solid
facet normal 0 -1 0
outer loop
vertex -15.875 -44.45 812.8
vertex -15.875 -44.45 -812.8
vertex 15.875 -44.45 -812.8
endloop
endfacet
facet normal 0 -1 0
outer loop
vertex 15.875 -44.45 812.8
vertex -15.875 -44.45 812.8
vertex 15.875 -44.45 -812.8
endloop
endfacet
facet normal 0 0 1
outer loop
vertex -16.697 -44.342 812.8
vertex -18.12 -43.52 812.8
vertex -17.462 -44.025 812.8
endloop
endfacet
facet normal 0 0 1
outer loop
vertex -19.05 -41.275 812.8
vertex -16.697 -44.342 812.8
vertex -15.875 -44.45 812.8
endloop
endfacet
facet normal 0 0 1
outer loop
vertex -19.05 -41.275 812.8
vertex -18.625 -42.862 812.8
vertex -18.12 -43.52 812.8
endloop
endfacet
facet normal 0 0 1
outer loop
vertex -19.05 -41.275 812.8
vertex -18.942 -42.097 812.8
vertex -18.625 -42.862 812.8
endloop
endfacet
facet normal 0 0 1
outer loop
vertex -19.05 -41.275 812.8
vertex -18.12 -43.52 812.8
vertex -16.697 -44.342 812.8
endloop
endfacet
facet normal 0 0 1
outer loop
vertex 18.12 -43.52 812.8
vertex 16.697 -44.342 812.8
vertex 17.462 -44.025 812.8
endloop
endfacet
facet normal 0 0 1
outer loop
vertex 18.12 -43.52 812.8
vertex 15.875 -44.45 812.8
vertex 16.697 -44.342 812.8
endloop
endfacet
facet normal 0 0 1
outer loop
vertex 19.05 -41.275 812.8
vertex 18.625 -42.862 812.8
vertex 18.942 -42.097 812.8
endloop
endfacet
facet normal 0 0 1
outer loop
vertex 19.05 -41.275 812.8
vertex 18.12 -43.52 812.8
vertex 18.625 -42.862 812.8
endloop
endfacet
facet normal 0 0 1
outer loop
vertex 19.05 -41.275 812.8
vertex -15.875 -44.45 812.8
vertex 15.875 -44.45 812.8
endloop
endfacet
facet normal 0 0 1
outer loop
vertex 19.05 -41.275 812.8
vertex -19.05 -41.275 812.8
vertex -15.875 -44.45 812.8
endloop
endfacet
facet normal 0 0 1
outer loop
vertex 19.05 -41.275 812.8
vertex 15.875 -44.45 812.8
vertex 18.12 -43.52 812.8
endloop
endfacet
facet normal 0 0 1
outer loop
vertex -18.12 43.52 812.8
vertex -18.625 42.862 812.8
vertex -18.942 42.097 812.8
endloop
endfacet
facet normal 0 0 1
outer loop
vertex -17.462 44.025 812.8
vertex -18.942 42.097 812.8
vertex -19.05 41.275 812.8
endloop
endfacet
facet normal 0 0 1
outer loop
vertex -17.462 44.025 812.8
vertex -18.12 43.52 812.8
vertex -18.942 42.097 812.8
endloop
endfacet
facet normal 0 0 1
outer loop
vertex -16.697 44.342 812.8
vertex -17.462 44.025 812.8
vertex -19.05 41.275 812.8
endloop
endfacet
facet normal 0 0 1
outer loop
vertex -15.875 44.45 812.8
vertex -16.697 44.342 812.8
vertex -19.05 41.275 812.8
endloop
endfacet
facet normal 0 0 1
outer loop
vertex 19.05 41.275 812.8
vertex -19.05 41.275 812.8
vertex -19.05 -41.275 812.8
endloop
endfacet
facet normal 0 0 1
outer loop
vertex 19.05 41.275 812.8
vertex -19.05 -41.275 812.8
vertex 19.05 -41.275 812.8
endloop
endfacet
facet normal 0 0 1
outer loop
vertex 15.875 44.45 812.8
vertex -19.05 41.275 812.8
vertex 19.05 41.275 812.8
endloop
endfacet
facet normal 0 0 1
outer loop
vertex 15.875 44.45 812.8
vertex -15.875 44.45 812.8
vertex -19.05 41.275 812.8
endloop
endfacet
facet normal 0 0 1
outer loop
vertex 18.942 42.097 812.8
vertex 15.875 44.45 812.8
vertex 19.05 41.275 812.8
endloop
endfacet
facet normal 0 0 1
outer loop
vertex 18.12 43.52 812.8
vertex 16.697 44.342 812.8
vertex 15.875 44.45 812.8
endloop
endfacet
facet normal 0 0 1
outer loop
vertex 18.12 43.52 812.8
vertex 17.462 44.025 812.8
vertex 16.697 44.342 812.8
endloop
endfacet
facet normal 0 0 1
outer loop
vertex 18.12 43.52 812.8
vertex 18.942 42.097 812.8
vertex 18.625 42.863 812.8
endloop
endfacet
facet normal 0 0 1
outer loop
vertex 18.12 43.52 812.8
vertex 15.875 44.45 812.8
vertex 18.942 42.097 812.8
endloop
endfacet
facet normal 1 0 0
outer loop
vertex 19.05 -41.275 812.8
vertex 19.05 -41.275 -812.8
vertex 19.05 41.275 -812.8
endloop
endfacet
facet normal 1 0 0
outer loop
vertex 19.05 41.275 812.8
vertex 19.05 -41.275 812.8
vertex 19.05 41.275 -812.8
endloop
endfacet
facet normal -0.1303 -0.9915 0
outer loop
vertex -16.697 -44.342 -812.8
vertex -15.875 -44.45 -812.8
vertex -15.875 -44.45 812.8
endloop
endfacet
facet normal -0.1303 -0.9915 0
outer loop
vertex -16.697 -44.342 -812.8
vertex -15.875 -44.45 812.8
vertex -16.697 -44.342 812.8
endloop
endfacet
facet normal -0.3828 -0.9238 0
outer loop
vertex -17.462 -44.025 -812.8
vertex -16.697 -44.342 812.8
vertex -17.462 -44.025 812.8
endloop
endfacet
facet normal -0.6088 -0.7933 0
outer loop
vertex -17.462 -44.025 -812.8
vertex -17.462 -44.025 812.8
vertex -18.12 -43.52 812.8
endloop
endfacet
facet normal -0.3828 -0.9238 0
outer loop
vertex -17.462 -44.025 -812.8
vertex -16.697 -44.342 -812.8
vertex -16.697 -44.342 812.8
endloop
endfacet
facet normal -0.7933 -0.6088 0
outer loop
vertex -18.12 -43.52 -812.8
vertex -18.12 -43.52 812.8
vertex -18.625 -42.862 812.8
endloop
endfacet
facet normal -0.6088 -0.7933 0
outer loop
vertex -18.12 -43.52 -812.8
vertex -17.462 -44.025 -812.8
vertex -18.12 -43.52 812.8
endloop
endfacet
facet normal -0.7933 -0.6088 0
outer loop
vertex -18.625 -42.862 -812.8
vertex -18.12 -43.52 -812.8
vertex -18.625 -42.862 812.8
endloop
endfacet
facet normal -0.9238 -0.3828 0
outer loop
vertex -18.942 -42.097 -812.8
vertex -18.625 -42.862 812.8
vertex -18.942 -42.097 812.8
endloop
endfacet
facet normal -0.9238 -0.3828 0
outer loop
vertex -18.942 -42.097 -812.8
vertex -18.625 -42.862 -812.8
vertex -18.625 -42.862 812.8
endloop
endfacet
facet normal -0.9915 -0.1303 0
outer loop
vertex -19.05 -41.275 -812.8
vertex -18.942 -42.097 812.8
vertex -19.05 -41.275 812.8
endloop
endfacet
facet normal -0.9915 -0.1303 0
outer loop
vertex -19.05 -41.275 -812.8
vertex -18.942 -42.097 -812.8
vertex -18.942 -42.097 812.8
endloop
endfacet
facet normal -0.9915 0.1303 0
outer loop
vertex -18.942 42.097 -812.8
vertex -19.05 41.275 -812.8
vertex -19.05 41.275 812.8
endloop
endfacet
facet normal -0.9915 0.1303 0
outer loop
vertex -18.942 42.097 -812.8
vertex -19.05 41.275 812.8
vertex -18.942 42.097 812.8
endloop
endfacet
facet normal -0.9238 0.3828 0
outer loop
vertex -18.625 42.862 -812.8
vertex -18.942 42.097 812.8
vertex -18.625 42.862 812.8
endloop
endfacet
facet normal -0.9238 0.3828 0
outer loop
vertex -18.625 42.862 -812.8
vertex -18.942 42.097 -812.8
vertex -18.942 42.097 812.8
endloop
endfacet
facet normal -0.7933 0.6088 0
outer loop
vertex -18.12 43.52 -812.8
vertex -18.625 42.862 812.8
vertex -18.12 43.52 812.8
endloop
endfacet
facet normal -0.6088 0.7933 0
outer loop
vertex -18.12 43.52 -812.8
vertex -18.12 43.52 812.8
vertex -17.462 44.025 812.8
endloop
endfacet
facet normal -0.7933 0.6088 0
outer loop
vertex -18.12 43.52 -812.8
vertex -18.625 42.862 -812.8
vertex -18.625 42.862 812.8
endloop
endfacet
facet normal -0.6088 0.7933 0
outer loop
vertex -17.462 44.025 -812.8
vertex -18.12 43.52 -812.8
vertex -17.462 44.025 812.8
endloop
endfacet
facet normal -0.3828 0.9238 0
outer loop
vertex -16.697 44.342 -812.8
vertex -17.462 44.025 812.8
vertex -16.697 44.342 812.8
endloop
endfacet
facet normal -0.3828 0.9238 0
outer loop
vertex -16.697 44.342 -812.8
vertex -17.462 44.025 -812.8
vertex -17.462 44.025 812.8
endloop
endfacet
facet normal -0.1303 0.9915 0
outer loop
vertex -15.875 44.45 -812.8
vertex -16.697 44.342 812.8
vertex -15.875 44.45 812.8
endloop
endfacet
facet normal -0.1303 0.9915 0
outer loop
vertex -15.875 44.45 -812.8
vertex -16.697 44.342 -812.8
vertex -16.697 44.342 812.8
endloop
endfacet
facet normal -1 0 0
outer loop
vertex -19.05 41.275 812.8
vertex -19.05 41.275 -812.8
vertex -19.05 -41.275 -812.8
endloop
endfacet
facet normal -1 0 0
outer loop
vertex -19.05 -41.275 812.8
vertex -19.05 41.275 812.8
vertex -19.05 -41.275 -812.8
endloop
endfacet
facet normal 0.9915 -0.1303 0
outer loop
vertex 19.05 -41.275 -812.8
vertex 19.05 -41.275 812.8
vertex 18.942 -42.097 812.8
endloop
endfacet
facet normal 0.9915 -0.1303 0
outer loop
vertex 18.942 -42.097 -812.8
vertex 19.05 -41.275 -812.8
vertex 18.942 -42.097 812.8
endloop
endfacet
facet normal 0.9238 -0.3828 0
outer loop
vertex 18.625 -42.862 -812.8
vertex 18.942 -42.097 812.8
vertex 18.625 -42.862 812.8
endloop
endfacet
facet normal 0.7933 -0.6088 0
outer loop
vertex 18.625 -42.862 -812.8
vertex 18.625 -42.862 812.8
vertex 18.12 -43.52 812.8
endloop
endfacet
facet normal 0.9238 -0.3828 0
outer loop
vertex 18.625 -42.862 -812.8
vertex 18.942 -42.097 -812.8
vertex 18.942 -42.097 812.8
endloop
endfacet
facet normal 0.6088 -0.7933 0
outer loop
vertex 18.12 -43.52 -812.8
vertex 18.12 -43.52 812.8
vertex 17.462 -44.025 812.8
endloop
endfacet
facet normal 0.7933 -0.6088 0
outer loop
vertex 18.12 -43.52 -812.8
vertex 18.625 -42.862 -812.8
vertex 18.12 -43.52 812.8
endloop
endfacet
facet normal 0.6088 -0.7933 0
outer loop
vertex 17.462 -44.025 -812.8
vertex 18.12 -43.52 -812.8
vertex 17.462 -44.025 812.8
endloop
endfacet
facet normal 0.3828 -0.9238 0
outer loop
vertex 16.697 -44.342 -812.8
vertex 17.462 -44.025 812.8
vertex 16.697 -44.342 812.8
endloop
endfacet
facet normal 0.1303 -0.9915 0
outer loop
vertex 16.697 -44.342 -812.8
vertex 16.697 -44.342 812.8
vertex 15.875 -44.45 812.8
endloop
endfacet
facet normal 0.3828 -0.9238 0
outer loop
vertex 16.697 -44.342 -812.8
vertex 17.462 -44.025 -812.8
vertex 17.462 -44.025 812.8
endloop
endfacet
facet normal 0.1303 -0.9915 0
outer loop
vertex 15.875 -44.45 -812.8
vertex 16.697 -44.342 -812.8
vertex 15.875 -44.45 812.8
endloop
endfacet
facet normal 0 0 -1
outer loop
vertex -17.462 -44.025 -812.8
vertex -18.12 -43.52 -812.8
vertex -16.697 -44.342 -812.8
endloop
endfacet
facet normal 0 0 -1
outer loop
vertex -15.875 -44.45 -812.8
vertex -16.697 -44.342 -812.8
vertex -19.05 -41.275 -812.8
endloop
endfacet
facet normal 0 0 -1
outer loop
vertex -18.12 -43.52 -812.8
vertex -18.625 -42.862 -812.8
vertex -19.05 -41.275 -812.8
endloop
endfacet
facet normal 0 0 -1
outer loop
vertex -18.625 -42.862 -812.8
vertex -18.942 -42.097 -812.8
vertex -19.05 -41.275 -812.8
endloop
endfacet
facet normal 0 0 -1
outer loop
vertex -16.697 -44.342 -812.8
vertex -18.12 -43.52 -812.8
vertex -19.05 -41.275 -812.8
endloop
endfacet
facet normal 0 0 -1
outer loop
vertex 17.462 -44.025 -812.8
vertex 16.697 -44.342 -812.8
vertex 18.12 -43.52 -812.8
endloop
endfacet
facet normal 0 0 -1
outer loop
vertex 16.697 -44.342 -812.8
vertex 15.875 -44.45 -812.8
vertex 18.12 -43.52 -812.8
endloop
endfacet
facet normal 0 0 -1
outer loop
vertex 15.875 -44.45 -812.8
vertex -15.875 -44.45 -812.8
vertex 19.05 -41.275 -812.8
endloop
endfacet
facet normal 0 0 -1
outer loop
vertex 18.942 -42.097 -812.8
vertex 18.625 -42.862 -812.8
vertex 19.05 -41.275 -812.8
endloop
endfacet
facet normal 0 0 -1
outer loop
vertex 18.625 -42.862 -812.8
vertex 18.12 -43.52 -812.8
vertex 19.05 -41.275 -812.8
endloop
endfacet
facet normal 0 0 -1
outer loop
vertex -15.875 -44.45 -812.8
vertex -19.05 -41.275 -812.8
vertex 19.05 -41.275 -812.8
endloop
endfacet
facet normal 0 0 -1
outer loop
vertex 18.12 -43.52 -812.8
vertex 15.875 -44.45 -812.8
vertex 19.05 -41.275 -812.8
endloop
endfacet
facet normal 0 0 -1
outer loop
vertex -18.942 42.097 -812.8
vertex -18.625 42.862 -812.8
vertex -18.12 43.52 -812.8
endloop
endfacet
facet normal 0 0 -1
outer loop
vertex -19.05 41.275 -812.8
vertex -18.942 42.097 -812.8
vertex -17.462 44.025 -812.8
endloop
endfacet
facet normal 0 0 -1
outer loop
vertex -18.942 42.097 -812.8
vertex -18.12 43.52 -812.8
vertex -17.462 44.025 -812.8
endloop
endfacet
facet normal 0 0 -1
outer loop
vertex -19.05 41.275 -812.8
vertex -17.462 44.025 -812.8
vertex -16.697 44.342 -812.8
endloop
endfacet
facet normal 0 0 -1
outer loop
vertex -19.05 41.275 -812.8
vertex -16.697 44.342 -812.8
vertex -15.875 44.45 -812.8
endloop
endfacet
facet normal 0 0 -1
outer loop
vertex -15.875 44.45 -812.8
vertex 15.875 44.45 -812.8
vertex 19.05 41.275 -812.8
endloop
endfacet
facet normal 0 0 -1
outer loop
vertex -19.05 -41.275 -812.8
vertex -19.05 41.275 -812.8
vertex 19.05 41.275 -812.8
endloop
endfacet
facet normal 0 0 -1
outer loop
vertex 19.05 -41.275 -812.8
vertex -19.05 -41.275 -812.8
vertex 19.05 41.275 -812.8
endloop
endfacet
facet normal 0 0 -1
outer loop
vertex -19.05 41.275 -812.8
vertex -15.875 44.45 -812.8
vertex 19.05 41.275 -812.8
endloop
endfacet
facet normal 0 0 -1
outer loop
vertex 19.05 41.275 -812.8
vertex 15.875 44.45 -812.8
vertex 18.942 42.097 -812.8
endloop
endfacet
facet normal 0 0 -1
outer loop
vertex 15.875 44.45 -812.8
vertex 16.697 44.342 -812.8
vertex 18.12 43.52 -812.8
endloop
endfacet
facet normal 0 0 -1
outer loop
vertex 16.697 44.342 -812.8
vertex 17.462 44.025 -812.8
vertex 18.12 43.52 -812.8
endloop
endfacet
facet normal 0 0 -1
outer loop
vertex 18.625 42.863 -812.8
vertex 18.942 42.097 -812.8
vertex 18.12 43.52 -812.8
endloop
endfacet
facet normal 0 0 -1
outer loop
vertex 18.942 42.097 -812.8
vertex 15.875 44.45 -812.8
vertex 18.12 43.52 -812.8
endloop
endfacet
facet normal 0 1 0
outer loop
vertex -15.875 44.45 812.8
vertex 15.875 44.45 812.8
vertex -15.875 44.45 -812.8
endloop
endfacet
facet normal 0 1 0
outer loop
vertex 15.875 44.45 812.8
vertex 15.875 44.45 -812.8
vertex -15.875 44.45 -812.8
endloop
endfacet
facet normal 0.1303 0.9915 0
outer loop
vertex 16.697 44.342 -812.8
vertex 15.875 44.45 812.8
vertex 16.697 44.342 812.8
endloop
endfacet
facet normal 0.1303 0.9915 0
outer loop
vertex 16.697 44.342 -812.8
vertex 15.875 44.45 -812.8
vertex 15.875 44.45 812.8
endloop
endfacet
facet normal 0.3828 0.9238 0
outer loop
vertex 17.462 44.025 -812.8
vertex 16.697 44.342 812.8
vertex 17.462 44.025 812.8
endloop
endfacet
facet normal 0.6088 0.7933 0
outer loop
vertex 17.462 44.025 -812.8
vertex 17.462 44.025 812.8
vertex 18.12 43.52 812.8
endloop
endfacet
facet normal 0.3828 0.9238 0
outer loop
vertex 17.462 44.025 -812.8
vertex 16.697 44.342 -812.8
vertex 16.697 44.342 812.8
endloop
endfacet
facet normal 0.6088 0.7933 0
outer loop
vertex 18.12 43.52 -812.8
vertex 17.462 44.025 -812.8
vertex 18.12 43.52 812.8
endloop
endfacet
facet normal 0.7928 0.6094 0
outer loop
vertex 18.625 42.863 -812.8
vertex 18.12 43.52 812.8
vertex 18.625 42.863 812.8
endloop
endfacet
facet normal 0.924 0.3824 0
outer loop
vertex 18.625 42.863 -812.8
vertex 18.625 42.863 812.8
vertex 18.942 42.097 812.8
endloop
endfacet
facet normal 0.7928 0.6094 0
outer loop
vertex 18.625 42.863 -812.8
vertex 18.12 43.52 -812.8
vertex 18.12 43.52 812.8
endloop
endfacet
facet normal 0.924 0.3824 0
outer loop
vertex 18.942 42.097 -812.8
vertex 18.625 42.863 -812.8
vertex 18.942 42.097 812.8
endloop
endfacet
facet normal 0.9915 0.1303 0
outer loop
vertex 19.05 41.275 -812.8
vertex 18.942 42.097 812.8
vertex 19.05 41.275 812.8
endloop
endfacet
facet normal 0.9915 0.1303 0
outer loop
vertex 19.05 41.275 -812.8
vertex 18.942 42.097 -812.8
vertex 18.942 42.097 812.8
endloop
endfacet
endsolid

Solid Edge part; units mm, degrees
sketch "Sketch1" plane through (0, 0, 0) normal (0, 0, 1) x (1, 0, 0)
  line L0 (-15.875, -44.45) -> (15.875, -44.45)
  arc A0 (19.05, -41.275) -> (15.875, -44.45) centre (15.875, -41.275) cw
  line L1 (19.05, -41.275) -> (19.05, 41.275)
  arc A1 (15.875, 44.45) -> (19.05, 41.275) centre (15.875, 41.275) cw
  line L2 (15.875, 44.45) -> (-15.875, 44.45)
  arc A2 (-19.05, 41.275) -> (-15.875, 44.45) centre (-15.875, 41.275) cw
  line L3 (-19.05, 41.275) -> (-19.05, -41.275)
  arc A3 (-15.875, -44.45) -> (-19.05, -41.275) centre (-15.875, -41.275) cw
  dimension "D1" = 88.9
  dimension "D2" = 38.1
  dimension "D3" = 3.175
extrude "Protrusion1" add sketch "Sketch1" along normal mid plane 1625.6
properties material "Wood, Mahogany"
